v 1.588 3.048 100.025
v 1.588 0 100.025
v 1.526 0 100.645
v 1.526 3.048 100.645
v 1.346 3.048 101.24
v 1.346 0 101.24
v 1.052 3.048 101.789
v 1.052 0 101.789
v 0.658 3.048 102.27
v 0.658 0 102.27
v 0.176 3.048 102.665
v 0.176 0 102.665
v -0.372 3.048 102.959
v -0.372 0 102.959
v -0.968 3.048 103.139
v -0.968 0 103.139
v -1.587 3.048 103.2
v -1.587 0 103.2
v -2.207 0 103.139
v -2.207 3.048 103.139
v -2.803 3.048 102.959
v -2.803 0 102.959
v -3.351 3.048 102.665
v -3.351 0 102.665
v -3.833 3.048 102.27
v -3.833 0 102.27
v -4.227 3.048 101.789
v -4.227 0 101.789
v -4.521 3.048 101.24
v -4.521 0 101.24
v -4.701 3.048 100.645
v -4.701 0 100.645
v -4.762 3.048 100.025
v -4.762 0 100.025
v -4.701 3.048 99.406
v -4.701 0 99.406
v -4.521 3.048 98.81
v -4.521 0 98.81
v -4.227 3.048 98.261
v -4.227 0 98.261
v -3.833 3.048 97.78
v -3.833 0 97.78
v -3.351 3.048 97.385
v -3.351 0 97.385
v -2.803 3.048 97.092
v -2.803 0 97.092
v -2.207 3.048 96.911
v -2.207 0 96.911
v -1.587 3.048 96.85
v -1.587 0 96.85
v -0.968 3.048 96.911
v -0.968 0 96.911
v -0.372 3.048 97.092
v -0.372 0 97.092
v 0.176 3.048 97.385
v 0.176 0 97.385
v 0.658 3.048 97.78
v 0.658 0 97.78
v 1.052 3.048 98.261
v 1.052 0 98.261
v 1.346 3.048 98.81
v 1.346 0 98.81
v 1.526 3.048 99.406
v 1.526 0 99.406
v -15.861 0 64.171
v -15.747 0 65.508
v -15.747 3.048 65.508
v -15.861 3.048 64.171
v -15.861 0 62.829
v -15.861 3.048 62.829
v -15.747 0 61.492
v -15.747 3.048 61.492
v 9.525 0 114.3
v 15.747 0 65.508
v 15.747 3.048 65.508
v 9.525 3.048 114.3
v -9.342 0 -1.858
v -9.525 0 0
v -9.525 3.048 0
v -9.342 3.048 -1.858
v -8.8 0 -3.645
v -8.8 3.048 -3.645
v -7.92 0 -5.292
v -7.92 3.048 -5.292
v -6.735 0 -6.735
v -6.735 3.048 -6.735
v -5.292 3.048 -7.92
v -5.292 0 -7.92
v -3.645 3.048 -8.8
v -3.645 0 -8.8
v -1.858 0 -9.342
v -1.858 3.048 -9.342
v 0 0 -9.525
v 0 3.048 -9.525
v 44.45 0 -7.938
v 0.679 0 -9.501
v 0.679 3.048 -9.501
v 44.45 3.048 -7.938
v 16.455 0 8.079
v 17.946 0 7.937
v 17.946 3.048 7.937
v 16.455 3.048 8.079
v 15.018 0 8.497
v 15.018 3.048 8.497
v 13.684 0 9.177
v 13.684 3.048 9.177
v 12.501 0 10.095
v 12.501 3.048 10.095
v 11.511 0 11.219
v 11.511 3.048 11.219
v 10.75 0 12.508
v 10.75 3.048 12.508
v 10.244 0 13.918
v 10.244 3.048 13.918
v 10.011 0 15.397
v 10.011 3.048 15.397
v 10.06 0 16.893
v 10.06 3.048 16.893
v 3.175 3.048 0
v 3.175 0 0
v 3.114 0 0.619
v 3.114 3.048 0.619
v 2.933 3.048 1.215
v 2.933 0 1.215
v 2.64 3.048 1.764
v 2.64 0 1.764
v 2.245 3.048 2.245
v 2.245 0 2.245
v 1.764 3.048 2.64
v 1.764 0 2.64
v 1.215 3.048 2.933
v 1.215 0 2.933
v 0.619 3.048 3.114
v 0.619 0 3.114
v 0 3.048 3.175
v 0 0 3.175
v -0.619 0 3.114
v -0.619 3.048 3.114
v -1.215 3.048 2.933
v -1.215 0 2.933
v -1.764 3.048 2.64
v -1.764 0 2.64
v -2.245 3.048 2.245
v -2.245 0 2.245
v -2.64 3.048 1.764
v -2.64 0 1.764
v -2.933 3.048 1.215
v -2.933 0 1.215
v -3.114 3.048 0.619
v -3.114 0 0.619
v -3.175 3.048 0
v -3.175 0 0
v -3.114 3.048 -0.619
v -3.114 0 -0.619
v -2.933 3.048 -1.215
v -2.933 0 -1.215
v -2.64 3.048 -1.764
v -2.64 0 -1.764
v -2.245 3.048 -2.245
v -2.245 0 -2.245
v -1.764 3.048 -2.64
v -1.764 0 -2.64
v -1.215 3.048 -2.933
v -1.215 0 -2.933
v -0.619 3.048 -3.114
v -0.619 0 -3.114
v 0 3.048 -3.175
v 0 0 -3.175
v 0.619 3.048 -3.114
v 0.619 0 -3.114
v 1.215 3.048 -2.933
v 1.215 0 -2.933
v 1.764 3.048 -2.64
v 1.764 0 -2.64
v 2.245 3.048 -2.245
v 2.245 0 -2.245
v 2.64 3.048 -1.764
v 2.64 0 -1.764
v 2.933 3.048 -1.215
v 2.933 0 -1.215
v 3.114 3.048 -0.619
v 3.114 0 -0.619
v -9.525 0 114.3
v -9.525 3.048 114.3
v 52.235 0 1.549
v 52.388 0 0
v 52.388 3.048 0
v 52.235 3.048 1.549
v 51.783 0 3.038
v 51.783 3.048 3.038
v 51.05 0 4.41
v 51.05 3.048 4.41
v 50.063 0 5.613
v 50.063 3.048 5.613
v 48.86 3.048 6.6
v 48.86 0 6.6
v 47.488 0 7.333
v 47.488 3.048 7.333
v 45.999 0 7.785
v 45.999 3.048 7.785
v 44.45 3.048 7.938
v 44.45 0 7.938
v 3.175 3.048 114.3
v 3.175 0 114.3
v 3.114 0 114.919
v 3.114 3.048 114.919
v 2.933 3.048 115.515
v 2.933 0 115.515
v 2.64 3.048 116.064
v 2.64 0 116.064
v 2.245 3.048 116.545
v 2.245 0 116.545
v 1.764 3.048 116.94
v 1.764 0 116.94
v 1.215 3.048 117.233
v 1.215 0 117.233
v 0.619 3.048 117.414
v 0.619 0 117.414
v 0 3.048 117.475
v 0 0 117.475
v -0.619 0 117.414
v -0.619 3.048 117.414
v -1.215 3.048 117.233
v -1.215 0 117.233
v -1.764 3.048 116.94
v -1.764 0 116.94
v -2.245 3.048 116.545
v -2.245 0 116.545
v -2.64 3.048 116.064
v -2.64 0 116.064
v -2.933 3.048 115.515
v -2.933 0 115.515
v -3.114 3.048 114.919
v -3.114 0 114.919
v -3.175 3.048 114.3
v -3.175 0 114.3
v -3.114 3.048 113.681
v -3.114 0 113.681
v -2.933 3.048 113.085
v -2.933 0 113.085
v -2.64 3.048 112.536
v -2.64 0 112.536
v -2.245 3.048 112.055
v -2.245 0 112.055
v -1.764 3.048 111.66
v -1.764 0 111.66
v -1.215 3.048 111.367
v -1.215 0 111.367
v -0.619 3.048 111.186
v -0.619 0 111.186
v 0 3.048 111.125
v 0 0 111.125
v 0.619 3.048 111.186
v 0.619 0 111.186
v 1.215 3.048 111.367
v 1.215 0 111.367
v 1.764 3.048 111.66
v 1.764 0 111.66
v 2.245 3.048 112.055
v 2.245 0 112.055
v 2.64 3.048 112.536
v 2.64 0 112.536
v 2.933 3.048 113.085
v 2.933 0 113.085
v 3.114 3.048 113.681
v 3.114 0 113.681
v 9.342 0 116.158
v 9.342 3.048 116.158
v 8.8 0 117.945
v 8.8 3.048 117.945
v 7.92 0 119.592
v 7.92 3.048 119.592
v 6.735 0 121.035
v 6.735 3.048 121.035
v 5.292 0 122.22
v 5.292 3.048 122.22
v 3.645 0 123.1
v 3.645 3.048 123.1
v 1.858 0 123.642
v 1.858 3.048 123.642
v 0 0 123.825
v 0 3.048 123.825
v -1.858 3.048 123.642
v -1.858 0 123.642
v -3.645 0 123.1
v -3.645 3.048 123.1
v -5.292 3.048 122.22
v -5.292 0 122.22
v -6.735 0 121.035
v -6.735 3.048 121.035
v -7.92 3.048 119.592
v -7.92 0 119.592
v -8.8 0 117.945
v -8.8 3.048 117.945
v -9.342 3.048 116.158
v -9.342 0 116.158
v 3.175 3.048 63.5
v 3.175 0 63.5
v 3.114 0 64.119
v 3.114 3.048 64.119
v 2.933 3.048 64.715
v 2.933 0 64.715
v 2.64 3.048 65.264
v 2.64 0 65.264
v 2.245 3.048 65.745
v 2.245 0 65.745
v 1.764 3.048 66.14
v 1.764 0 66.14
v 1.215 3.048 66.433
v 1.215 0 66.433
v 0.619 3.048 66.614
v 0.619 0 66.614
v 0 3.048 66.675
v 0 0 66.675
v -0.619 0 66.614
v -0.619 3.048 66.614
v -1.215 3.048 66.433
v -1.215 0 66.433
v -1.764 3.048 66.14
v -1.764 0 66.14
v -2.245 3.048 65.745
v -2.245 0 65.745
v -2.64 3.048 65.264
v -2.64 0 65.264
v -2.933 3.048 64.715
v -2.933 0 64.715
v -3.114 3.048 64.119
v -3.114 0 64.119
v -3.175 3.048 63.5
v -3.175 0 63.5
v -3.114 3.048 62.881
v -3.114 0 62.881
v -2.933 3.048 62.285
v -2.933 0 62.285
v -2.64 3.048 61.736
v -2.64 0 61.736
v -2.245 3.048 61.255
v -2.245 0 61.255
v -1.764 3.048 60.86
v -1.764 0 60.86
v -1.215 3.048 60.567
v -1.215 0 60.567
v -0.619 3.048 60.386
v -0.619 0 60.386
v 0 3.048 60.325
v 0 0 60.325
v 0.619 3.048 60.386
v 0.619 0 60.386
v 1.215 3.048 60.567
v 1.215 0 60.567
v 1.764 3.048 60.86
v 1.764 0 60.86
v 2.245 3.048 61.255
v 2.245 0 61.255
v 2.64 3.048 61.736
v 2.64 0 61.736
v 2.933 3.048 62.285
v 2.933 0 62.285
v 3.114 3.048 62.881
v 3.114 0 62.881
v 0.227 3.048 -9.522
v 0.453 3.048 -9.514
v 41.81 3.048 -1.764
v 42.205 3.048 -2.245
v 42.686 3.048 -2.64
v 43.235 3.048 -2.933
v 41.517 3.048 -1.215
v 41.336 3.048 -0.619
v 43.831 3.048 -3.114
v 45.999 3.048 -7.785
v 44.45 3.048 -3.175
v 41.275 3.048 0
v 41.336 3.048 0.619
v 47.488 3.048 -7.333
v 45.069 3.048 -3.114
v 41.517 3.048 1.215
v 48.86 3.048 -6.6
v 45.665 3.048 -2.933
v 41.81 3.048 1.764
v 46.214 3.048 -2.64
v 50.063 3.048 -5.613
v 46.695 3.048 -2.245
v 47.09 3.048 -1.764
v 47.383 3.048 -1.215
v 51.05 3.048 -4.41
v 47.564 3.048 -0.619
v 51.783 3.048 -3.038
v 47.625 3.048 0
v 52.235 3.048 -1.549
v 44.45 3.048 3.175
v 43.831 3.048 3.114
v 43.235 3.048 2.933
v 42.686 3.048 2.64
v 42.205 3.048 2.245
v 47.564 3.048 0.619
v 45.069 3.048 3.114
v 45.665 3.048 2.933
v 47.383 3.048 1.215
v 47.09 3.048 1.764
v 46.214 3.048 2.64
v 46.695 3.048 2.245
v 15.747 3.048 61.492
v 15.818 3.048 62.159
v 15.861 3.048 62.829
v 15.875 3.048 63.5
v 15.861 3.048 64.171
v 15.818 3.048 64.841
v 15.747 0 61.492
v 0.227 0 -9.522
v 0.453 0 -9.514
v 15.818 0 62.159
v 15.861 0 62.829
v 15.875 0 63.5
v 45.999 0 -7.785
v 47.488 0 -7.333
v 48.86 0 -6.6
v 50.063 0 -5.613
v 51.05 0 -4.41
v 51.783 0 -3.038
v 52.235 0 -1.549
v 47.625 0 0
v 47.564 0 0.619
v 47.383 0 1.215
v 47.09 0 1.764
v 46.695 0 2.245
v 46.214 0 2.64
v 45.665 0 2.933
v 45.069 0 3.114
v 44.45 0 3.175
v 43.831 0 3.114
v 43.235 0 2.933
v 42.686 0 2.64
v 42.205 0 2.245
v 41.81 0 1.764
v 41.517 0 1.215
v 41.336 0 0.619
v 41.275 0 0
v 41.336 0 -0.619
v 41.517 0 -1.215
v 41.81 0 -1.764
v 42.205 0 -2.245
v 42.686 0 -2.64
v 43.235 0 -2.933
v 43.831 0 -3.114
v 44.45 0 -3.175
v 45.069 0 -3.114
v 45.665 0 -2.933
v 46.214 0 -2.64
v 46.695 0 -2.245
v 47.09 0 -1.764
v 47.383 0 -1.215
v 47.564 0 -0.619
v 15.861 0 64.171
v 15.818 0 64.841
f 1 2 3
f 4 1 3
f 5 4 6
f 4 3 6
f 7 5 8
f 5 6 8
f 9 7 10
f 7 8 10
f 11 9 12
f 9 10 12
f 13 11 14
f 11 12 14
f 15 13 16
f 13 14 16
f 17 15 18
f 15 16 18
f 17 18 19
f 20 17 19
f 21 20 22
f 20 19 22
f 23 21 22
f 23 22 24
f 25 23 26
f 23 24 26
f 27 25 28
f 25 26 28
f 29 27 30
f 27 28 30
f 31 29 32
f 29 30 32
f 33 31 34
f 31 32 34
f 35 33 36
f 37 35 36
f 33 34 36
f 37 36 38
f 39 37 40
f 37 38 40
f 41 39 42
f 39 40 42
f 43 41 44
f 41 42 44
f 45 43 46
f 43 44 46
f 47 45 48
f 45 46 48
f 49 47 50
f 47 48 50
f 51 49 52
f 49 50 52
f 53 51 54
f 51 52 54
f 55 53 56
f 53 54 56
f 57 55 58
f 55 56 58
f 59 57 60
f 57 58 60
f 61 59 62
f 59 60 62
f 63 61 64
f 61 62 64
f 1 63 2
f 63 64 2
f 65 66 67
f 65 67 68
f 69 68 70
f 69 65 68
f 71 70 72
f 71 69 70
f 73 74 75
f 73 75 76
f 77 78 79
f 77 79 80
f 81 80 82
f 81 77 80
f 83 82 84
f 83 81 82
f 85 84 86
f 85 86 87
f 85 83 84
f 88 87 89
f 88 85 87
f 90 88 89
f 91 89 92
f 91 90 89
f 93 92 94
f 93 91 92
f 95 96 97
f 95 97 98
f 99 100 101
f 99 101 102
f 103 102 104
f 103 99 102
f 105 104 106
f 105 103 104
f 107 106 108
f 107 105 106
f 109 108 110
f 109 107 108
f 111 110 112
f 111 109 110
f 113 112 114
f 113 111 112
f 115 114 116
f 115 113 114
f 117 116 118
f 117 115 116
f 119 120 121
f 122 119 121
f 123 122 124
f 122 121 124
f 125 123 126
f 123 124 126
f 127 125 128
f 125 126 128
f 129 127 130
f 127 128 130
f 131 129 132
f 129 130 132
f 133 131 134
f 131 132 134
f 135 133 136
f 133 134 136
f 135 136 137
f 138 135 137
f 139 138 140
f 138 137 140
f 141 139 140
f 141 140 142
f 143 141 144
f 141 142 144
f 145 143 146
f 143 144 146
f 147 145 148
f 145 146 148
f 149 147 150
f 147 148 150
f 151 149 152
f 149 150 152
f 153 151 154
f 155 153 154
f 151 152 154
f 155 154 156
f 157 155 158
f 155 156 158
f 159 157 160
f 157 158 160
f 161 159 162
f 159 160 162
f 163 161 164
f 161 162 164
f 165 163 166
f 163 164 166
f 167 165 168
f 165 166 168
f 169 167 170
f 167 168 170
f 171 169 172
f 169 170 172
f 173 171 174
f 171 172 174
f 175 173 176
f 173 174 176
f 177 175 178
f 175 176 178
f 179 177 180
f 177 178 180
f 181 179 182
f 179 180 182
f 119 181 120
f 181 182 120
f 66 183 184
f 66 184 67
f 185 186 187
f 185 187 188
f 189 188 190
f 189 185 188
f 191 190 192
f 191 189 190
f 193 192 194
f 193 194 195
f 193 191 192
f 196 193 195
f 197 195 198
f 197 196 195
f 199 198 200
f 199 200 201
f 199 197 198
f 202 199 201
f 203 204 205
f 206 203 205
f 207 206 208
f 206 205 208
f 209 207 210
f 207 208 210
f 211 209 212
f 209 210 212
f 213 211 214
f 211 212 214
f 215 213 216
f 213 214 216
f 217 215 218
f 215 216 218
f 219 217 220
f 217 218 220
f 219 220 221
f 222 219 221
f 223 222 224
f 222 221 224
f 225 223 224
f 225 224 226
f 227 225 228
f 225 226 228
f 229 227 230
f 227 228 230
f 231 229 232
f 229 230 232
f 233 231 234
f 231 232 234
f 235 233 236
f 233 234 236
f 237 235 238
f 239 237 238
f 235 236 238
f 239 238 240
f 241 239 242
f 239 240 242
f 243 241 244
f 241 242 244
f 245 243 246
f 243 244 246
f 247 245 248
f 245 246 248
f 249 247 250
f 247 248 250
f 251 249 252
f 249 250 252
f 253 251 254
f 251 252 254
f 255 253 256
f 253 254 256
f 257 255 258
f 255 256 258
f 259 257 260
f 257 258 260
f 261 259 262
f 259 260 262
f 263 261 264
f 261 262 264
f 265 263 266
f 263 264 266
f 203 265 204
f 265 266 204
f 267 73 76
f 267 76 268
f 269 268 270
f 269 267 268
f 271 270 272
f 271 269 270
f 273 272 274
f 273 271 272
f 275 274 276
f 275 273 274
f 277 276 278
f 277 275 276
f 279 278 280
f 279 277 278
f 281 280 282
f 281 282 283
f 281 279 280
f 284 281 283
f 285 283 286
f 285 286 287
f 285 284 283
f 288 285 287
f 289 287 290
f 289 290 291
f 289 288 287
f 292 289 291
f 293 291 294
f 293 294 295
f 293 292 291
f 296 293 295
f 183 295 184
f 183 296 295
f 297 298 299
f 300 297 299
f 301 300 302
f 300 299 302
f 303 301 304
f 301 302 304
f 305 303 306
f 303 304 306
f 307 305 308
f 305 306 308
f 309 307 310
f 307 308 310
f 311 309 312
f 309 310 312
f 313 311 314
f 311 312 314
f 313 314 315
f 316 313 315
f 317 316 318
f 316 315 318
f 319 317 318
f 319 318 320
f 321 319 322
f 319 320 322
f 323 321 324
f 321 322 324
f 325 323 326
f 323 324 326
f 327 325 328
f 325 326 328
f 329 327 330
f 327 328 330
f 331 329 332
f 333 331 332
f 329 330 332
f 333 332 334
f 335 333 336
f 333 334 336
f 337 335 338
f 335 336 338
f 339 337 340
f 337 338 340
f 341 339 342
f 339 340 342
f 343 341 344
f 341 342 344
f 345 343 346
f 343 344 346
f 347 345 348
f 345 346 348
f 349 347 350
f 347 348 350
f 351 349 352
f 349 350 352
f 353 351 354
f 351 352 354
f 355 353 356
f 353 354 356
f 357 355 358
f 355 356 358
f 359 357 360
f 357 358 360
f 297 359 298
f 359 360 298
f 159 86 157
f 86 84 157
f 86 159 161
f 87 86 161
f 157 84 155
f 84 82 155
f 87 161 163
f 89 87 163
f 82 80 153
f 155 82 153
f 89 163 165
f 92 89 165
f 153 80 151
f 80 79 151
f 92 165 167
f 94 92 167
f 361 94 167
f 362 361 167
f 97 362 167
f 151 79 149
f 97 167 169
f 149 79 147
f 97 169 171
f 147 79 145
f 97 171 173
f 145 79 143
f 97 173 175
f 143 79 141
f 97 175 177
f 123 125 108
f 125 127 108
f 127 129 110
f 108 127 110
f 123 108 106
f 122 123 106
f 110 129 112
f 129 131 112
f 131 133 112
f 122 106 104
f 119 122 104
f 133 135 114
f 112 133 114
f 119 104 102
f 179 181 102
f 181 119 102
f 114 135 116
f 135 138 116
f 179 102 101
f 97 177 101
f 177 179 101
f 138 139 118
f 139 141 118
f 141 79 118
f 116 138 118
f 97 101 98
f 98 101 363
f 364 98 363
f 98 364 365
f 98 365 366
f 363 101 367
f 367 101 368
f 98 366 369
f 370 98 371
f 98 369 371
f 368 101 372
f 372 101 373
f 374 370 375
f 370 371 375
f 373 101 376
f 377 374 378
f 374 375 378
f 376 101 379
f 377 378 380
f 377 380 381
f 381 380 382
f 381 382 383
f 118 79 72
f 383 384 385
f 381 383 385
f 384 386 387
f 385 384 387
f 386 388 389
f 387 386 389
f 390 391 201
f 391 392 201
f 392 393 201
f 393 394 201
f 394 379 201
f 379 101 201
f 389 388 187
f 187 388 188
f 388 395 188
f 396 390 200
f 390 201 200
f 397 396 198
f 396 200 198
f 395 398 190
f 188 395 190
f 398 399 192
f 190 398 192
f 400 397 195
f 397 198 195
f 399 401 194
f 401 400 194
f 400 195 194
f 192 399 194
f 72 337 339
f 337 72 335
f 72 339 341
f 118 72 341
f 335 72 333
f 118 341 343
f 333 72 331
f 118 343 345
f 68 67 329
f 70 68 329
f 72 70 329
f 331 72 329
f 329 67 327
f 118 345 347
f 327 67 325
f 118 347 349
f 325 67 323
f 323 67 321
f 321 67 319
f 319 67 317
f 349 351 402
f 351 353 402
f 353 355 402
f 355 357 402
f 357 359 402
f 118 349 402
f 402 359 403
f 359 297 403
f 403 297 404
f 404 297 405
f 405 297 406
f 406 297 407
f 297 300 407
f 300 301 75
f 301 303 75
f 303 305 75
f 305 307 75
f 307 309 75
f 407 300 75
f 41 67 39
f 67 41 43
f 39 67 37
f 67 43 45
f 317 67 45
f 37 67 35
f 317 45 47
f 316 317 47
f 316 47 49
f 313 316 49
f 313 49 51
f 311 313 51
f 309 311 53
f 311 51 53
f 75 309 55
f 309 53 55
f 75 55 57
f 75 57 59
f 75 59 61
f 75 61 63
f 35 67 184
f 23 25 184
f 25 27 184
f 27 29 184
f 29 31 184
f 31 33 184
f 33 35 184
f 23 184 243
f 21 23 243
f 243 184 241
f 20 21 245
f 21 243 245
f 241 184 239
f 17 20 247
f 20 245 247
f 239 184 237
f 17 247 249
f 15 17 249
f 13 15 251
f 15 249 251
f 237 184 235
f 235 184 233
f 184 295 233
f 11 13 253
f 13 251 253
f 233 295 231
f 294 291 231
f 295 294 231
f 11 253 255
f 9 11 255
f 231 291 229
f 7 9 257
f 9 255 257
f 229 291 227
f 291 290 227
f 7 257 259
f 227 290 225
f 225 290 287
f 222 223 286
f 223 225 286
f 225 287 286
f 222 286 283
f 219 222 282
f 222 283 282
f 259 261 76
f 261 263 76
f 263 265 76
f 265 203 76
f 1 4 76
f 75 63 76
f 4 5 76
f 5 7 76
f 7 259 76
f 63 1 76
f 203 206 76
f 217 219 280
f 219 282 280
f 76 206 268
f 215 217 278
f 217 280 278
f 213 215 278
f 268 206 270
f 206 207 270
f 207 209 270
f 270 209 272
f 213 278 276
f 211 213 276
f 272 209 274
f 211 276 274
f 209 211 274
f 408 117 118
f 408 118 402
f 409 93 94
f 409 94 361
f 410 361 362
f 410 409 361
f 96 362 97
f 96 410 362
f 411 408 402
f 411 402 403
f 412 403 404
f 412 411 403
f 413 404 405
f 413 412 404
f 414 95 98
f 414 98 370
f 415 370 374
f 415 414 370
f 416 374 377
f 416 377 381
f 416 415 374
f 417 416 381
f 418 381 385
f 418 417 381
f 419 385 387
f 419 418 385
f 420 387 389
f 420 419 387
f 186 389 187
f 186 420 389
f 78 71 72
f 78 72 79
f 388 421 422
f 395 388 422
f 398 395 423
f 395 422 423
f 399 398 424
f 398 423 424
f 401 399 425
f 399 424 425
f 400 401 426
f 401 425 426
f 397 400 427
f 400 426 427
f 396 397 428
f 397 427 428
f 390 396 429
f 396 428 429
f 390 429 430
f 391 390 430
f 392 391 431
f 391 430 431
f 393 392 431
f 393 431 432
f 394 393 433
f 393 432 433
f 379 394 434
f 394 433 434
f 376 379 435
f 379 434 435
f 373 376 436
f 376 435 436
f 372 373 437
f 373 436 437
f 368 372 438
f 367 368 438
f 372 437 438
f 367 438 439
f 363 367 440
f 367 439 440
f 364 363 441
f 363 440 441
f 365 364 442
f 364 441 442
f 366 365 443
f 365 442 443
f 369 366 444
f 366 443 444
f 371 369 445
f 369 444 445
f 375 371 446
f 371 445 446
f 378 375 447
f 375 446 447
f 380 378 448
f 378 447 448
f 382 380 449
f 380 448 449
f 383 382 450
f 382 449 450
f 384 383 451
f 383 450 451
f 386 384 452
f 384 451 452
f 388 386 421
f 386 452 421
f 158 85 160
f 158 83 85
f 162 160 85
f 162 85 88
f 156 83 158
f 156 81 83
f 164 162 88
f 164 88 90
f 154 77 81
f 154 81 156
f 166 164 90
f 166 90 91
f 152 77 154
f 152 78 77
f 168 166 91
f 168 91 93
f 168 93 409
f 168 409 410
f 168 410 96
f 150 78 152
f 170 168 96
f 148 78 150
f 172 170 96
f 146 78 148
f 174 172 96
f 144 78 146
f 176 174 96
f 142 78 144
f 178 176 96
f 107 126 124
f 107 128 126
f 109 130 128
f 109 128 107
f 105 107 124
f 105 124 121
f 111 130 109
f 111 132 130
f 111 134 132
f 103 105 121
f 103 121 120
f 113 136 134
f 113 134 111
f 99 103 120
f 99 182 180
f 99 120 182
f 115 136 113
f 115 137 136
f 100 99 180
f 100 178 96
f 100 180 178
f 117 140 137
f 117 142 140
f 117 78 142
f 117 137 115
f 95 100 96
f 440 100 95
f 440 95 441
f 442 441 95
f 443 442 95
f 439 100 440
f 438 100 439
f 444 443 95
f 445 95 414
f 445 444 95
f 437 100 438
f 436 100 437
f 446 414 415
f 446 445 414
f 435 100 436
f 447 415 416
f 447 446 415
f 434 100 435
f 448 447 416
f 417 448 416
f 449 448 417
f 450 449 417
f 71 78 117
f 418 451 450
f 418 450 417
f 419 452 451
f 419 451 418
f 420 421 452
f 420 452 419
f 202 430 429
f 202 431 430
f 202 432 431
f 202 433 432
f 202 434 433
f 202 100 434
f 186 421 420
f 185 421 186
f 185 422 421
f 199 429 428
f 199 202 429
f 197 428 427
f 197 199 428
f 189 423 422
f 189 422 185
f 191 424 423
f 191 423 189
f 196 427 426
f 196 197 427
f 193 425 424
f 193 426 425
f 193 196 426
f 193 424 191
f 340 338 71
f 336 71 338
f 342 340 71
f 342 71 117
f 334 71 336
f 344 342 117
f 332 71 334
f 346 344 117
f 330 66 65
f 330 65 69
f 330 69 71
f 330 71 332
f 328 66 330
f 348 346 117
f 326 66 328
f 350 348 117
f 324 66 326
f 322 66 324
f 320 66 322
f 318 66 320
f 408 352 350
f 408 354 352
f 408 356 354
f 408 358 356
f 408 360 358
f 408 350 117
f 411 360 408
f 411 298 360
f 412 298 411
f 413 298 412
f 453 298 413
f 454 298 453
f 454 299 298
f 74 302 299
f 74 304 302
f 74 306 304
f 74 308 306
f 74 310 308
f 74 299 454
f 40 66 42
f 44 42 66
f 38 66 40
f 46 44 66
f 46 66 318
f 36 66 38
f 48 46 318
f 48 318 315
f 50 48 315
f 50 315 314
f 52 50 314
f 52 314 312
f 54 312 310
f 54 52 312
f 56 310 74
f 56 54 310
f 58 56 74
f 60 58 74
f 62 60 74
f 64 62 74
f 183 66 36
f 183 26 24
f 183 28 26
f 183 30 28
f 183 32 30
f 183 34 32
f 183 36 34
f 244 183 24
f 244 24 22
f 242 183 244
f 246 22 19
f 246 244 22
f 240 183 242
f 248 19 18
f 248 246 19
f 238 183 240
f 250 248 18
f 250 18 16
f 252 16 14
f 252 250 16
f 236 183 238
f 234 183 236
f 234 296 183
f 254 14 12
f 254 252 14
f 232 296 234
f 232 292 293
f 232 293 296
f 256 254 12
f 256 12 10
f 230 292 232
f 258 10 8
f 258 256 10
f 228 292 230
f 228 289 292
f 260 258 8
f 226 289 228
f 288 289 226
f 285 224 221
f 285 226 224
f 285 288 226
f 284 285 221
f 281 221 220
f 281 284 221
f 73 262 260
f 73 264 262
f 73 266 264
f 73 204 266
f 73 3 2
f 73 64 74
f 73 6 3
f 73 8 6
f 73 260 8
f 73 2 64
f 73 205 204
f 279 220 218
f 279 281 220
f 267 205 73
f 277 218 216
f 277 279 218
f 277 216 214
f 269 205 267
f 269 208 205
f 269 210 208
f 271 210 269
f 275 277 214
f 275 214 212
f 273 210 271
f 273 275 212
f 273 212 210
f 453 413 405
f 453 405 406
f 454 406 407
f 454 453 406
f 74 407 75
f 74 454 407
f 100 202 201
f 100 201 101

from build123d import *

# Parameters (mm, degrees)
F0_R     = 3.175
F1_DEPTH = 3.048


with BuildPart() as f1:
    # F0 (on Front) → F1 (new body)
    with BuildSketch(Plane.XZ):
        with BuildLine():
            ThreePointArc((0.67949, -9.500732), (6.97129, -6.490511), (9.525, 0))
            ThreePointArc((9.525, 0), (0, 9.525), (-9.525, 0))
            ThreePointArc((-9.525, 0), (-6.735192, -6.735192), (0, -9.525))
            Line((0, -9.525), (0.67949, -9.500732))
        make_face()
        Circle(F0_R, mode=Mode.SUBTRACT)
        with BuildLine():
            ThreePointArc((-9.525, 0), (0, 9.525), (9.525, 0))
            ThreePointArc((9.525, 0), (6.97129, -6.490511), (0.67949, -9.500732))
            Line((0.67949, -9.500732), (44.45, -7.9375))
            ThreePointArc((44.45, -7.9375), (36.5125, 0), (44.45, 7.9375))
            Line((44.45, 7.9375), (17.946122, 7.9375))
            ThreePointArc((17.946122, 7.9375), (11.979481, 10.633666), (10.059795, 16.893451))
            Line((10.059795, 16.893451), (15.747457, 61.491711))
            ThreePointArc((15.747457, 61.491711), (0, 47.625), (-15.747457, 61.491711))
            Line((-15.747457, 61.491711), (-9.525, 0))
        make_face()
        with BuildLine():
            ThreePointArc((0, -9.525), (0.339962, -9.518931), (0.67949, -9.500732))
            Line((0.67949, -9.500732), (0, -9.525))
        make_face()
        with BuildLine():
            ThreePointArc((-15.747457, 65.508289), (-15.875, 63.5), (-15.747457, 61.491711))
            ThreePointArc((-15.747457, 61.491711), (0, 47.625), (15.747457, 61.491711))
            ThreePointArc((15.747457, 61.491711), (15.843082, 62.493832), (15.875, 63.5))
            ThreePointArc((15.875, 63.5), (15.843082, 64.506168), (15.747457, 65.508289))
            ThreePointArc((15.747457, 65.508289), (0, 79.375), (-15.747457, 65.508289))
        make_face()
        with Locations((0, 63.5)):
            Circle(F0_R, mode=Mode.SUBTRACT)
        with BuildLine():
            ThreePointArc((44.45, 7.9375), (36.5125, 0), (44.45, -7.9375))
            ThreePointArc((44.45, -7.9375), (50.06266, -5.61266), (52.3875, 0))
            ThreePointArc((52.3875, 0), (50.06266, 5.61266), (44.45, 7.9375))
        make_face()
        with Locations((44.45, 0)):
            Circle(F0_R, mode=Mode.SUBTRACT)
        with BuildLine():
            Line((-9.525, 114.3), (-15.747457, 65.508289))
            ThreePointArc((-15.747457, 65.508289), (0, 79.375), (15.747457, 65.508289))
            Line((15.747457, 65.508289), (9.525, 114.3))
            ThreePointArc((9.525, 114.3), (0, 104.775), (-9.525, 114.3))
        make_face()
        with Locations((-1.5875, 100.0252)):
            Circle(F0_R, mode=Mode.SUBTRACT)
        with BuildLine():
            ThreePointArc((9.525, 114.3), (0, 123.825), (-9.525, 114.3))
            ThreePointArc((-9.525, 114.3), (0, 104.775), (9.525, 114.3))
        make_face()
        with Locations((0, 114.3)):
            Circle(F0_R, mode=Mode.SUBTRACT)
    extrude(amount=-F1_DEPTH)


solid = f1.part
